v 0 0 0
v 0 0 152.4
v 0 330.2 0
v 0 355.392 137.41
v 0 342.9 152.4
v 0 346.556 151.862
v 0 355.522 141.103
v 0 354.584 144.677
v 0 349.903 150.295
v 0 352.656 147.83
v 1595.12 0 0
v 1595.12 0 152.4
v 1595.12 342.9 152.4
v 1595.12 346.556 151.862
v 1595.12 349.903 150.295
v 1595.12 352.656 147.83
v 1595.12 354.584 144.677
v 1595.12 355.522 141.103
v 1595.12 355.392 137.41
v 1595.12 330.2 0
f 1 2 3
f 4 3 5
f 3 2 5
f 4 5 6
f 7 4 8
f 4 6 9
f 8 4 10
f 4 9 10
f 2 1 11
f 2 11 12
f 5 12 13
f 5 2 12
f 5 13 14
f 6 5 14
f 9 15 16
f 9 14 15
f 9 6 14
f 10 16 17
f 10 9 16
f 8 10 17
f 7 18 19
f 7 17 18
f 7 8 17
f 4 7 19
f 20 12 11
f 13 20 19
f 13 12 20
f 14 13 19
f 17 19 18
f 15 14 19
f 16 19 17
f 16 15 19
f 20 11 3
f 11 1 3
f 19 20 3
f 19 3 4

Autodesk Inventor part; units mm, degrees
ref_plane "YZ Plane" through (0, 0, 0) normal (1, 0, 0) x (0, 1, 0)
ref_plane "XZ Plane" through (0, 0, 0) normal (0, 1, 0) x (-1, 0, 0)
ref_plane "XY Plane" through (0, 0, 0) normal (0, 0, 1) x (1, 0, 0)
sketch "Sketch2" plane through (0, 0, 0) normal (1, 0, 0) x (0, 1, 0)
  line L0 (0, 0) -> (0, 152.4)
  line L1 (0, 152.4) -> (342.9, 152.4)
  line L2 (0, 0) -> (330.2, 0)
  line L3 (330.2, 0) -> (355.3918, 137.4098)
  arc A0 (355.3918, 137.4098) -> (342.9, 152.4) centre (342.9, 139.7) ccw
  point P0 (358.14, 152.4)
  dimension "d2" = 152.4
  dimension "d3" = 330.2
  dimension "d4" = 12.7
  dimension "d7" = 342.9
extrude "Extrusion1" add sketch "Sketch2" along normal blind 1595.12
properties part number "B" material "Granite, Cut, Polished"
